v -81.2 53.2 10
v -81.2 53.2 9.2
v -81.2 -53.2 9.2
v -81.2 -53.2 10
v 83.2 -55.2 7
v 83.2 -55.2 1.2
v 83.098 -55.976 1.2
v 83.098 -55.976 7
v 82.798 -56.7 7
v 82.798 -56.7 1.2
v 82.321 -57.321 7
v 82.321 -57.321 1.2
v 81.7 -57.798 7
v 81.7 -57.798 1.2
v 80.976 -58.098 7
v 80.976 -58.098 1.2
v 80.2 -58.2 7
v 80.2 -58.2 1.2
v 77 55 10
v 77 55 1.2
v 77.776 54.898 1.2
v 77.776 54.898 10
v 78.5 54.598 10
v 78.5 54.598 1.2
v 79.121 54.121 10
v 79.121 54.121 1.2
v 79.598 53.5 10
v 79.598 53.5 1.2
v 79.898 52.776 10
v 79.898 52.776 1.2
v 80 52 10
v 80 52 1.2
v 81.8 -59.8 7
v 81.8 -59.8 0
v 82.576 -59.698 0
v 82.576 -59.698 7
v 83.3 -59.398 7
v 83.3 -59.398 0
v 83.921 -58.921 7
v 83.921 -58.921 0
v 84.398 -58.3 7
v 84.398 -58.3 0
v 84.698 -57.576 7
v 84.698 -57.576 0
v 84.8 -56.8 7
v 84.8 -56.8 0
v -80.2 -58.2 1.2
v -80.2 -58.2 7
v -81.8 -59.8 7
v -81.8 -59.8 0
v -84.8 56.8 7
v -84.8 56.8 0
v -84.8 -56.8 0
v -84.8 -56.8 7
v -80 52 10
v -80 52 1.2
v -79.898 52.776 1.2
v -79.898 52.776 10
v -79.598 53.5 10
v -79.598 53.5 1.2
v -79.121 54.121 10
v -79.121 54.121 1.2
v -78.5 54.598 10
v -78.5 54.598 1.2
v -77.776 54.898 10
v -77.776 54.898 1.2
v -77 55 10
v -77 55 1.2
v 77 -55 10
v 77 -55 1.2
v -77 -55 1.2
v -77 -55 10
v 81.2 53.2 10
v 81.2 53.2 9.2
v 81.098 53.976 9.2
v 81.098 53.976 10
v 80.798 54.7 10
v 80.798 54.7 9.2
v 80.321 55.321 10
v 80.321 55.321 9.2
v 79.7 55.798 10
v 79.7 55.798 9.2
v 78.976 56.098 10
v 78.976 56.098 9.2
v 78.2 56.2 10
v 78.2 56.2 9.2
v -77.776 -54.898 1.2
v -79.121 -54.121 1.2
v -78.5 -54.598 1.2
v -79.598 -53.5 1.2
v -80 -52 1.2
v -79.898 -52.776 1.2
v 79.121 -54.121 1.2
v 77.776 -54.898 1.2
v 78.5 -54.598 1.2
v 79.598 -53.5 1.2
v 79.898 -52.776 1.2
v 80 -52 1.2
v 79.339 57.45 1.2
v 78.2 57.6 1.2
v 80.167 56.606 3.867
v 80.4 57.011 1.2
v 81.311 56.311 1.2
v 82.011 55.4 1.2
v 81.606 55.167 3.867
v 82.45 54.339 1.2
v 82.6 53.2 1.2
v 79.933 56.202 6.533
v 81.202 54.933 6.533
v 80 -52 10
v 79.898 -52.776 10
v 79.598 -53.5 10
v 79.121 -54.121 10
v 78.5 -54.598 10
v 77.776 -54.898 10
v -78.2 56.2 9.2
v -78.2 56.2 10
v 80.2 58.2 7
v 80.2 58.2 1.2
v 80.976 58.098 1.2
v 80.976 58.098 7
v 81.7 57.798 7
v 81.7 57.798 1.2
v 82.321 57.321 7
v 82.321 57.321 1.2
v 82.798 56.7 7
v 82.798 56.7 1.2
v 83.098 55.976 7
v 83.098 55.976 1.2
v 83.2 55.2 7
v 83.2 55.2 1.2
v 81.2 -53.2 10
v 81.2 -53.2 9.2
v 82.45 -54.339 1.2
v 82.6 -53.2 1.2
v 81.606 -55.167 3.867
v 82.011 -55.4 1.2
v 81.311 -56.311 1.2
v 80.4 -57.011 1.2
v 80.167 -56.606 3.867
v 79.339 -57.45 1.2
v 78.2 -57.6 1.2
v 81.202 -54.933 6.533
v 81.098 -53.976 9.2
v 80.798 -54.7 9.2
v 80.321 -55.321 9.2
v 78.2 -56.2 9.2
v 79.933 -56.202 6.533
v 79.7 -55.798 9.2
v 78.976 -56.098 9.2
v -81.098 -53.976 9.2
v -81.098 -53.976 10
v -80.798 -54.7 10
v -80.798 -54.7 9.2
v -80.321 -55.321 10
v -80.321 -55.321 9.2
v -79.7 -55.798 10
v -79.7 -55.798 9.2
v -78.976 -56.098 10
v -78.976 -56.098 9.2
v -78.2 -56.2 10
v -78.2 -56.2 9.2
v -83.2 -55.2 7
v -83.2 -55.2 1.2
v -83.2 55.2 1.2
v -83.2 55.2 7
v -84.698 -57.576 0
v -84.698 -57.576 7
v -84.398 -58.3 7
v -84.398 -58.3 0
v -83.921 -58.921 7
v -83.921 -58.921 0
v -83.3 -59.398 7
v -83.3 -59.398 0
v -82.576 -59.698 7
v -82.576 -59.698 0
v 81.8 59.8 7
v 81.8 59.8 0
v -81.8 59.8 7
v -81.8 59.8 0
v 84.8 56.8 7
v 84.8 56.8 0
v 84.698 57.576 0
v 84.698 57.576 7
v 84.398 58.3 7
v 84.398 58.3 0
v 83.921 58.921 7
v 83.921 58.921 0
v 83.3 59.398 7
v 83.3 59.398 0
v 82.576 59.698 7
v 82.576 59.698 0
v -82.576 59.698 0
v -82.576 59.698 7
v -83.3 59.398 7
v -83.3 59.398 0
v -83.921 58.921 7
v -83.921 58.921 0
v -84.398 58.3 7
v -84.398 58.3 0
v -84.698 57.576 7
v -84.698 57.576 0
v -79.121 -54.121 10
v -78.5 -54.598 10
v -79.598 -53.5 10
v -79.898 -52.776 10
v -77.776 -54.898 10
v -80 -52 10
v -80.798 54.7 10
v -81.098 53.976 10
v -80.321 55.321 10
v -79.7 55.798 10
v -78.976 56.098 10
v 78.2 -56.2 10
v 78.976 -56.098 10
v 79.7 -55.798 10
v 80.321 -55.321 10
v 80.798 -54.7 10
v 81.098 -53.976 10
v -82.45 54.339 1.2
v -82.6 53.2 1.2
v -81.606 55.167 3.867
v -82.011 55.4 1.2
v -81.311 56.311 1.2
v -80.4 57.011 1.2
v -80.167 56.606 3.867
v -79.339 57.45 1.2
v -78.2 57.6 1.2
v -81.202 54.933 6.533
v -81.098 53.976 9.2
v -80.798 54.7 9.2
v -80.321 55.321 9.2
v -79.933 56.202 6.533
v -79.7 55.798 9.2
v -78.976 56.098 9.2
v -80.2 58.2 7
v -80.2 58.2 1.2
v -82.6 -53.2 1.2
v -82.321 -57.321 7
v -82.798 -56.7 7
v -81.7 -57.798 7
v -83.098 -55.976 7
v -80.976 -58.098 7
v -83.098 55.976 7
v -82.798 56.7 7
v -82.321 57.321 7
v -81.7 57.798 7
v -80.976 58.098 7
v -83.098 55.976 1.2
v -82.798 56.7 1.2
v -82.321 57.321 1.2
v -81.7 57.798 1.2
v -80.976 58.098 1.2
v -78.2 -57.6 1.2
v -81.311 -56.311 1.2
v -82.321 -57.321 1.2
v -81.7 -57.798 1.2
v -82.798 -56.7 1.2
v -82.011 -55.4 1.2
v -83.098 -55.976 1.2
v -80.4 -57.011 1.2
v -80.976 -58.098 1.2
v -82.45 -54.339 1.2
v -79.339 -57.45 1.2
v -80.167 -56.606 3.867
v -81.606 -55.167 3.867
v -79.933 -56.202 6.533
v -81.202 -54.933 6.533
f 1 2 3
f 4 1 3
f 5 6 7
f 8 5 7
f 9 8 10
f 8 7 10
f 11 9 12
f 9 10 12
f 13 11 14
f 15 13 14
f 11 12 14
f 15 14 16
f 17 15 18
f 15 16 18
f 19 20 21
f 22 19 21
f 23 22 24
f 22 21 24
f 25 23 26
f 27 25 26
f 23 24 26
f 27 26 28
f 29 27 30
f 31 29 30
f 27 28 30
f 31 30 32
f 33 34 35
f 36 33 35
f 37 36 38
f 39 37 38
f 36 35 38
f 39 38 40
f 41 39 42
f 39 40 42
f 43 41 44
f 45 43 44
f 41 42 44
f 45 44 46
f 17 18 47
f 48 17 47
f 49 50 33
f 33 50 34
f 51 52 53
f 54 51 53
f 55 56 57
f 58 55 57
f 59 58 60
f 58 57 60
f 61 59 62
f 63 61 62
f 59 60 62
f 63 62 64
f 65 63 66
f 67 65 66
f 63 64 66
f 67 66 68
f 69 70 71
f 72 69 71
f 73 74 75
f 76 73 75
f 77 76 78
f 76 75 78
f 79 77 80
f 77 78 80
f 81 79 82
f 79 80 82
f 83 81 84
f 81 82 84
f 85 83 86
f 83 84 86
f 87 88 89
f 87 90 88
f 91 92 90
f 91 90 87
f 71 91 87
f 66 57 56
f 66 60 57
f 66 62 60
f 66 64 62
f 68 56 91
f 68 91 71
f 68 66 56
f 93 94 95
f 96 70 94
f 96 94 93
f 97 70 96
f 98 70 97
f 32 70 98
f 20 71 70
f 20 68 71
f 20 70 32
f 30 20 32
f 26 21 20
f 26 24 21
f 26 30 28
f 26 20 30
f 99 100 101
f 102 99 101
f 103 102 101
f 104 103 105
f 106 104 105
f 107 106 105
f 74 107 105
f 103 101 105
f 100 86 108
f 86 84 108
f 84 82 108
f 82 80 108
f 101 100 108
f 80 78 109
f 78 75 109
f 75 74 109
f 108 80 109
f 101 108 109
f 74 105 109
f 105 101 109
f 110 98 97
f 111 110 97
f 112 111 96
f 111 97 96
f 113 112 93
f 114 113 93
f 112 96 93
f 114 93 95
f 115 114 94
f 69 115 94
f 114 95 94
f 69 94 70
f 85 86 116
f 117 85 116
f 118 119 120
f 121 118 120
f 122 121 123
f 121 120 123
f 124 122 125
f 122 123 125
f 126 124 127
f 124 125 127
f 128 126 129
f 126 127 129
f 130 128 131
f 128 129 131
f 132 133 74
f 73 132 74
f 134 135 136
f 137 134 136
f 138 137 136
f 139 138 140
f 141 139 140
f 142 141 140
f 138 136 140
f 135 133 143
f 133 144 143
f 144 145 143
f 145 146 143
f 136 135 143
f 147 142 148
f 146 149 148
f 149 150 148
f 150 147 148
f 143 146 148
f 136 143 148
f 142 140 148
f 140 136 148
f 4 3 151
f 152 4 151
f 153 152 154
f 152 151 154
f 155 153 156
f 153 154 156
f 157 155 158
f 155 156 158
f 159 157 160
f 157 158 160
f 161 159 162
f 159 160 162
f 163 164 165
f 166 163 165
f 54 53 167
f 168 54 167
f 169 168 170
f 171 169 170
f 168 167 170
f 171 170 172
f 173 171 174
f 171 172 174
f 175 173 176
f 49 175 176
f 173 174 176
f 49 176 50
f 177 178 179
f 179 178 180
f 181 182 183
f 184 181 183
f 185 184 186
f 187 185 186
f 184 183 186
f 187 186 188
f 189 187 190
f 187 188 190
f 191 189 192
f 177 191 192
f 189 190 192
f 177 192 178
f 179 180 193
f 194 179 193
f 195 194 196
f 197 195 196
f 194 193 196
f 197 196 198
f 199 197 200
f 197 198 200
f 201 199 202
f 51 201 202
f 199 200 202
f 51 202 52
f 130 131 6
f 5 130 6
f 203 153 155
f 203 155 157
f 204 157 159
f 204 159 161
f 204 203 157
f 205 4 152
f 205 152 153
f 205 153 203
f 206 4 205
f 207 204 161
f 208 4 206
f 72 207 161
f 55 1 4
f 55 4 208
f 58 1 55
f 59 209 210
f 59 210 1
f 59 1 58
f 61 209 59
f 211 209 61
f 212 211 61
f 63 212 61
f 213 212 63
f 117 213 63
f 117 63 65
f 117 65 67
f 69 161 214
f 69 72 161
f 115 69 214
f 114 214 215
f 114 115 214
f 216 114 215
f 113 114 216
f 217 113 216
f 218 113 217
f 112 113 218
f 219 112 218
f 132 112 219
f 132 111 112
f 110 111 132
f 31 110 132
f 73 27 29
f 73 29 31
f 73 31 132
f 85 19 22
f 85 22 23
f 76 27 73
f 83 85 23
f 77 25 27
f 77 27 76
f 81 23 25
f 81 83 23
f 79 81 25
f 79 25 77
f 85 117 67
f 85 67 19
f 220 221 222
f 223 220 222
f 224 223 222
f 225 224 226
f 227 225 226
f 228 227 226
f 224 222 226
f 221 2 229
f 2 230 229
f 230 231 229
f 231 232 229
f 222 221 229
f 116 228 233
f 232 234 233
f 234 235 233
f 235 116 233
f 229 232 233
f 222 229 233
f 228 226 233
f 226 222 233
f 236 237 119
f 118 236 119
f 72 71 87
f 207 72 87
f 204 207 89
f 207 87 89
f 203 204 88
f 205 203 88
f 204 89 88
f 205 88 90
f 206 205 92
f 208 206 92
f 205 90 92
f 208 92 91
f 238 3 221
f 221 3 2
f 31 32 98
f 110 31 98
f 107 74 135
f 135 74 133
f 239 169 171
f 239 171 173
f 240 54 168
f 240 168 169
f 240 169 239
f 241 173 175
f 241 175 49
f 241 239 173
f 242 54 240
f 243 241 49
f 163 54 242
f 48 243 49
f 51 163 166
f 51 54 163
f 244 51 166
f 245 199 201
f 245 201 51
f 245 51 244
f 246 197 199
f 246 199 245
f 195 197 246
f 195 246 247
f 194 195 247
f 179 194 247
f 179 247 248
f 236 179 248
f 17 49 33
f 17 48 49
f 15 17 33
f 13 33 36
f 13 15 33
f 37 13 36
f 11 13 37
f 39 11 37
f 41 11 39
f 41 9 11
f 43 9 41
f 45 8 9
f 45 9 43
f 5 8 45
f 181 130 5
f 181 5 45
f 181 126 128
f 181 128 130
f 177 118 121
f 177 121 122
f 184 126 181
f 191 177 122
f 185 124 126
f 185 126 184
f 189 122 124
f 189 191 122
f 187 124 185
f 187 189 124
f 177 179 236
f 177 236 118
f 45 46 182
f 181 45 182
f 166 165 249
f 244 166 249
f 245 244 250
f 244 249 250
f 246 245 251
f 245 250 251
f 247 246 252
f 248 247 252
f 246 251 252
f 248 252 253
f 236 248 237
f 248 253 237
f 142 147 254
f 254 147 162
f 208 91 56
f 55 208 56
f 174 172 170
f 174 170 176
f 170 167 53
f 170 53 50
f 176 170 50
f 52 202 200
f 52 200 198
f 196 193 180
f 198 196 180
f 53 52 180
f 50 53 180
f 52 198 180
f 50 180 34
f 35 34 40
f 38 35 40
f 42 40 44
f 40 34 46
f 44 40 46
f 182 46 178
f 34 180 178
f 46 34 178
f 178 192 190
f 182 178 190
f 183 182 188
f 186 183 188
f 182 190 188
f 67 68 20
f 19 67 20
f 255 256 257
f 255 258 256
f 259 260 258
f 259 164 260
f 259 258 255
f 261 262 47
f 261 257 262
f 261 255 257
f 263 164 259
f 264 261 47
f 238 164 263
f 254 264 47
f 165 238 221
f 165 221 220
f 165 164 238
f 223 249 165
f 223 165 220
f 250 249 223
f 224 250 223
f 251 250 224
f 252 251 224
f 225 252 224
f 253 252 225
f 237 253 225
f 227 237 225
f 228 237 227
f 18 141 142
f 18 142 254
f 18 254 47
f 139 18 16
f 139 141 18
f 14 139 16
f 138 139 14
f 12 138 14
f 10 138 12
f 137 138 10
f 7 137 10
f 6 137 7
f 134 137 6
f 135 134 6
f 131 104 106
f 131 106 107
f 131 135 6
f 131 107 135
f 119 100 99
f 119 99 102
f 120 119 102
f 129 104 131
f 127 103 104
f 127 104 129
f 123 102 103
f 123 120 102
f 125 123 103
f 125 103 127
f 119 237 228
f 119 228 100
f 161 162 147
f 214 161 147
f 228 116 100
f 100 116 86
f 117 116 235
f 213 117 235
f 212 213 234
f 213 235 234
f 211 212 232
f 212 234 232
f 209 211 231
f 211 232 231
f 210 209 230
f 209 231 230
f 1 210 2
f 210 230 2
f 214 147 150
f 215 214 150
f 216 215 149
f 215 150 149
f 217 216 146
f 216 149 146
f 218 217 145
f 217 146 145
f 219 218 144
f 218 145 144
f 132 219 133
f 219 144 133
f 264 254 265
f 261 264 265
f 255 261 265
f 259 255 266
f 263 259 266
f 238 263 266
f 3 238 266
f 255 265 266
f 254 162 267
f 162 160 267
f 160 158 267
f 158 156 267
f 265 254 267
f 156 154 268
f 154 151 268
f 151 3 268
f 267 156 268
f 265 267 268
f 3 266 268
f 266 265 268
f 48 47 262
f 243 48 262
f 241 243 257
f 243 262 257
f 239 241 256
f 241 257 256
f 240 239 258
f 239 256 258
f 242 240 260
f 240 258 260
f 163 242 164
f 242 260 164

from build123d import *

# Parameters (mm, degrees)
F1_DEPTH = 1.2
F2_DEPTH = 10
F3_DEPTH = 7
F4_SIZE2 = 8
F4_SIZE  = 1.4


with BuildPart() as f1:
    # F0 (on Top) → F1 (new body)
    with BuildSketch(Plane.XY):
        with BuildLine():
            Line((81.8, 59.8), (-81.8, 59.8))
            ThreePointArc((-81.8, 59.8), (-83.9213203436, 58.9213203436), (-84.8, 56.8))
            Line((-84.8, 56.8), (-84.8, -56.8))
            ThreePointArc((-84.8, -56.8), (-83.9213203436, -58.9213203436), (-81.8, -59.8))
            Line((-81.8, -59.8), (81.8, -59.8))
            ThreePointArc((81.8, -59.8), (83.9213203436, -58.9213203436), (84.8, -56.8))
            Line((84.8, -56.8), (84.8, 56.8))
            ThreePointArc((84.8, 56.8), (83.9213203436, 58.9213203436), (81.8, 59.8))
        make_face()
        with BuildLine():
            ThreePointArc((83.2, -55.2), (82.3213203436, -57.3213203436), (80.2, -58.2))
            Line((80.2, -58.2), (-80.2, -58.2))
            ThreePointArc((-80.2, -58.2), (-82.3213203436, -57.3213203436), (-83.2, -55.2))
            Line((-83.2, -55.2), (-83.2, 55.2))
            ThreePointArc((-83.2, 55.2), (-82.3213203436, 57.3213203436), (-80.2, 58.2))
            Line((-80.2, 58.2), (80.2, 58.2))
            ThreePointArc((80.2, 58.2), (82.3213203436, 57.3213203436), (83.2, 55.2))
            Line((83.2, 55.2), (83.2, -55.2))
        make_face(mode=Mode.SUBTRACT)
        with BuildLine():
            Line((-80.2, -58.2), (80.2, -58.2))
            ThreePointArc((80.2, -58.2), (82.3213203436, -57.3213203436), (83.2, -55.2))
            Line((83.2, -55.2), (83.2, 55.2))
            ThreePointArc((83.2, 55.2), (82.3213203436, 57.3213203436), (80.2, 58.2))
            Line((80.2, 58.2), (-80.2, 58.2))
            ThreePointArc((-80.2, 58.2), (-82.3213203436, 57.3213203436), (-83.2, 55.2))
            Line((-83.2, 55.2), (-83.2, -55.2))
            ThreePointArc((-83.2, -55.2), (-82.3213203436, -57.3213203436), (-80.2, -58.2))
        make_face()
        with BuildLine():
            ThreePointArc((-81.2, 53.2), (-80.3213203436, 55.3213203436), (-78.2, 56.2))
            Line((-78.2, 56.2), (78.2, 56.2))
            ThreePointArc((78.2, 56.2), (80.3213203436, 55.3213203436), (81.2, 53.2))
            Line((81.2, 53.2), (81.2, -53.2))
            ThreePointArc((81.2, -53.2), (80.3213203436, -55.3213203436), (78.2, -56.2))
            Line((78.2, -56.2), (-78.2, -56.2))
            ThreePointArc((-78.2, -56.2), (-80.3213203436, -55.3213203436), (-81.2, -53.2))
            Line((-81.2, -53.2), (-81.2, 53.2))
        make_face(mode=Mode.SUBTRACT)
        with BuildLine():
            Line((78.2, 56.2), (-78.2, 56.2))
            ThreePointArc((-78.2, 56.2), (-80.3213203436, 55.3213203436), (-81.2, 53.2))
            Line((-81.2, 53.2), (-81.2, -53.2))
            ThreePointArc((-81.2, -53.2), (-80.3213203436, -55.3213203436), (-78.2, -56.2))
            Line((-78.2, -56.2), (78.2, -56.2))
            ThreePointArc((78.2, -56.2), (80.3213203436, -55.3213203436), (81.2, -53.2))
            Line((81.2, -53.2), (81.2, 53.2))
            ThreePointArc((81.2, 53.2), (80.3213203436, 55.3213203436), (78.2, 56.2))
        make_face()
        with BuildLine():
            ThreePointArc((-80, 52), (-79.1213203436, 54.1213203436), (-77, 55))
            Line((-77, 55), (77, 55))
            ThreePointArc((77, 55), (79.1213203436, 54.1213203436), (80, 52))
            Line((80, 52), (80, -52))
            ThreePointArc((80, -52), (79.1213203436, -54.1213203436), (77, -55))
            Line((77, -55), (-77, -55))
            ThreePointArc((-77, -55), (-79.1213203436, -54.1213203436), (-80, -52))
            Line((-80, -52), (-80, 52))
        make_face(mode=Mode.SUBTRACT)
        with BuildLine():
            Line((77, 55), (-77, 55))
            ThreePointArc((-77, 55), (-79.1213203436, 54.1213203436), (-80, 52))
            Line((-80, 52), (-80, -52))
            ThreePointArc((-80, -52), (-79.1213203436, -54.1213203436), (-77, -55))
            Line((-77, -55), (77, -55))
            ThreePointArc((77, -55), (79.1213203436, -54.1213203436), (80, -52))
            Line((80, -52), (80, 52))
            ThreePointArc((80, 52), (79.1213203436, 54.1213203436), (77, 55))
        make_face()
    extrude(amount=F1_DEPTH)

    # F0 (on Top) → F2 (join)
    with BuildSketch(Plane.XY):
        with BuildLine():
            Line((78.2, 56.2), (-78.2, 56.2))
            ThreePointArc((-78.2, 56.2), (-80.3213203436, 55.3213203436), (-81.2, 53.2))
            Line((-81.2, 53.2), (-81.2, -53.2))
            ThreePointArc((-81.2, -53.2), (-80.3213203436, -55.3213203436), (-78.2, -56.2))
            Line((-78.2, -56.2), (78.2, -56.2))
            ThreePointArc((78.2, -56.2), (80.3213203436, -55.3213203436), (81.2, -53.2))
            Line((81.2, -53.2), (81.2, 53.2))
            ThreePointArc((81.2, 53.2), (80.3213203436, 55.3213203436), (78.2, 56.2))
        make_face()
        with BuildLine():
            ThreePointArc((-80, 52), (-79.1213203436, 54.1213203436), (-77, 55))
            Line((-77, 55), (77, 55))
            ThreePointArc((77, 55), (79.1213203436, 54.1213203436), (80, 52))
            Line((80, 52), (80, -52))
            ThreePointArc((80, -52), (79.1213203436, -54.1213203436), (77, -55))
            Line((77, -55), (-77, -55))
            ThreePointArc((-77, -55), (-79.1213203436, -54.1213203436), (-80, -52))
            Line((-80, -52), (-80, 52))
        make_face(mode=Mode.SUBTRACT)
    extrude(amount=F2_DEPTH)

    # F0 (on Top) → F3 (join)
    with BuildSketch(Plane.XY):
        with BuildLine():
            Line((81.8, 59.8), (-81.8, 59.8))
            ThreePointArc((-81.8, 59.8), (-83.9213203436, 58.9213203436), (-84.8, 56.8))
            Line((-84.8, 56.8), (-84.8, -56.8))
            ThreePointArc((-84.8, -56.8), (-83.9213203436, -58.9213203436), (-81.8, -59.8))
            Line((-81.8, -59.8), (81.8, -59.8))
            ThreePointArc((81.8, -59.8), (83.9213203436, -58.9213203436), (84.8, -56.8))
            Line((84.8, -56.8), (84.8, 56.8))
            ThreePointArc((84.8, 56.8), (83.9213203436, 58.9213203436), (81.8, 59.8))
        make_face()
        with BuildLine():
            ThreePointArc((83.2, -55.2), (82.3213203436, -57.3213203436), (80.2, -58.2))
            Line((80.2, -58.2), (-80.2, -58.2))
            ThreePointArc((-80.2, -58.2), (-82.3213203436, -57.3213203436), (-83.2, -55.2))
            Line((-83.2, -55.2), (-83.2, 55.2))
            ThreePointArc((-83.2, 55.2), (-82.3213203436, 57.3213203436), (-80.2, 58.2))
            Line((-80.2, 58.2), (80.2, 58.2))
            ThreePointArc((80.2, 58.2), (82.3213203436, 57.3213203436), (83.2, 55.2))
            Line((83.2, 55.2), (83.2, -55.2))
        make_face(mode=Mode.SUBTRACT)
    extrude(amount=F3_DEPTH)

    # F4
    f4_edges = [f1.edges().sort_by_distance(p)[0] for p in [
        (-81.2, 0, 1.2),
    ]]
    chamfer(f4_edges, length=F4_SIZE, length2=F4_SIZE2)


solid = f1.part
